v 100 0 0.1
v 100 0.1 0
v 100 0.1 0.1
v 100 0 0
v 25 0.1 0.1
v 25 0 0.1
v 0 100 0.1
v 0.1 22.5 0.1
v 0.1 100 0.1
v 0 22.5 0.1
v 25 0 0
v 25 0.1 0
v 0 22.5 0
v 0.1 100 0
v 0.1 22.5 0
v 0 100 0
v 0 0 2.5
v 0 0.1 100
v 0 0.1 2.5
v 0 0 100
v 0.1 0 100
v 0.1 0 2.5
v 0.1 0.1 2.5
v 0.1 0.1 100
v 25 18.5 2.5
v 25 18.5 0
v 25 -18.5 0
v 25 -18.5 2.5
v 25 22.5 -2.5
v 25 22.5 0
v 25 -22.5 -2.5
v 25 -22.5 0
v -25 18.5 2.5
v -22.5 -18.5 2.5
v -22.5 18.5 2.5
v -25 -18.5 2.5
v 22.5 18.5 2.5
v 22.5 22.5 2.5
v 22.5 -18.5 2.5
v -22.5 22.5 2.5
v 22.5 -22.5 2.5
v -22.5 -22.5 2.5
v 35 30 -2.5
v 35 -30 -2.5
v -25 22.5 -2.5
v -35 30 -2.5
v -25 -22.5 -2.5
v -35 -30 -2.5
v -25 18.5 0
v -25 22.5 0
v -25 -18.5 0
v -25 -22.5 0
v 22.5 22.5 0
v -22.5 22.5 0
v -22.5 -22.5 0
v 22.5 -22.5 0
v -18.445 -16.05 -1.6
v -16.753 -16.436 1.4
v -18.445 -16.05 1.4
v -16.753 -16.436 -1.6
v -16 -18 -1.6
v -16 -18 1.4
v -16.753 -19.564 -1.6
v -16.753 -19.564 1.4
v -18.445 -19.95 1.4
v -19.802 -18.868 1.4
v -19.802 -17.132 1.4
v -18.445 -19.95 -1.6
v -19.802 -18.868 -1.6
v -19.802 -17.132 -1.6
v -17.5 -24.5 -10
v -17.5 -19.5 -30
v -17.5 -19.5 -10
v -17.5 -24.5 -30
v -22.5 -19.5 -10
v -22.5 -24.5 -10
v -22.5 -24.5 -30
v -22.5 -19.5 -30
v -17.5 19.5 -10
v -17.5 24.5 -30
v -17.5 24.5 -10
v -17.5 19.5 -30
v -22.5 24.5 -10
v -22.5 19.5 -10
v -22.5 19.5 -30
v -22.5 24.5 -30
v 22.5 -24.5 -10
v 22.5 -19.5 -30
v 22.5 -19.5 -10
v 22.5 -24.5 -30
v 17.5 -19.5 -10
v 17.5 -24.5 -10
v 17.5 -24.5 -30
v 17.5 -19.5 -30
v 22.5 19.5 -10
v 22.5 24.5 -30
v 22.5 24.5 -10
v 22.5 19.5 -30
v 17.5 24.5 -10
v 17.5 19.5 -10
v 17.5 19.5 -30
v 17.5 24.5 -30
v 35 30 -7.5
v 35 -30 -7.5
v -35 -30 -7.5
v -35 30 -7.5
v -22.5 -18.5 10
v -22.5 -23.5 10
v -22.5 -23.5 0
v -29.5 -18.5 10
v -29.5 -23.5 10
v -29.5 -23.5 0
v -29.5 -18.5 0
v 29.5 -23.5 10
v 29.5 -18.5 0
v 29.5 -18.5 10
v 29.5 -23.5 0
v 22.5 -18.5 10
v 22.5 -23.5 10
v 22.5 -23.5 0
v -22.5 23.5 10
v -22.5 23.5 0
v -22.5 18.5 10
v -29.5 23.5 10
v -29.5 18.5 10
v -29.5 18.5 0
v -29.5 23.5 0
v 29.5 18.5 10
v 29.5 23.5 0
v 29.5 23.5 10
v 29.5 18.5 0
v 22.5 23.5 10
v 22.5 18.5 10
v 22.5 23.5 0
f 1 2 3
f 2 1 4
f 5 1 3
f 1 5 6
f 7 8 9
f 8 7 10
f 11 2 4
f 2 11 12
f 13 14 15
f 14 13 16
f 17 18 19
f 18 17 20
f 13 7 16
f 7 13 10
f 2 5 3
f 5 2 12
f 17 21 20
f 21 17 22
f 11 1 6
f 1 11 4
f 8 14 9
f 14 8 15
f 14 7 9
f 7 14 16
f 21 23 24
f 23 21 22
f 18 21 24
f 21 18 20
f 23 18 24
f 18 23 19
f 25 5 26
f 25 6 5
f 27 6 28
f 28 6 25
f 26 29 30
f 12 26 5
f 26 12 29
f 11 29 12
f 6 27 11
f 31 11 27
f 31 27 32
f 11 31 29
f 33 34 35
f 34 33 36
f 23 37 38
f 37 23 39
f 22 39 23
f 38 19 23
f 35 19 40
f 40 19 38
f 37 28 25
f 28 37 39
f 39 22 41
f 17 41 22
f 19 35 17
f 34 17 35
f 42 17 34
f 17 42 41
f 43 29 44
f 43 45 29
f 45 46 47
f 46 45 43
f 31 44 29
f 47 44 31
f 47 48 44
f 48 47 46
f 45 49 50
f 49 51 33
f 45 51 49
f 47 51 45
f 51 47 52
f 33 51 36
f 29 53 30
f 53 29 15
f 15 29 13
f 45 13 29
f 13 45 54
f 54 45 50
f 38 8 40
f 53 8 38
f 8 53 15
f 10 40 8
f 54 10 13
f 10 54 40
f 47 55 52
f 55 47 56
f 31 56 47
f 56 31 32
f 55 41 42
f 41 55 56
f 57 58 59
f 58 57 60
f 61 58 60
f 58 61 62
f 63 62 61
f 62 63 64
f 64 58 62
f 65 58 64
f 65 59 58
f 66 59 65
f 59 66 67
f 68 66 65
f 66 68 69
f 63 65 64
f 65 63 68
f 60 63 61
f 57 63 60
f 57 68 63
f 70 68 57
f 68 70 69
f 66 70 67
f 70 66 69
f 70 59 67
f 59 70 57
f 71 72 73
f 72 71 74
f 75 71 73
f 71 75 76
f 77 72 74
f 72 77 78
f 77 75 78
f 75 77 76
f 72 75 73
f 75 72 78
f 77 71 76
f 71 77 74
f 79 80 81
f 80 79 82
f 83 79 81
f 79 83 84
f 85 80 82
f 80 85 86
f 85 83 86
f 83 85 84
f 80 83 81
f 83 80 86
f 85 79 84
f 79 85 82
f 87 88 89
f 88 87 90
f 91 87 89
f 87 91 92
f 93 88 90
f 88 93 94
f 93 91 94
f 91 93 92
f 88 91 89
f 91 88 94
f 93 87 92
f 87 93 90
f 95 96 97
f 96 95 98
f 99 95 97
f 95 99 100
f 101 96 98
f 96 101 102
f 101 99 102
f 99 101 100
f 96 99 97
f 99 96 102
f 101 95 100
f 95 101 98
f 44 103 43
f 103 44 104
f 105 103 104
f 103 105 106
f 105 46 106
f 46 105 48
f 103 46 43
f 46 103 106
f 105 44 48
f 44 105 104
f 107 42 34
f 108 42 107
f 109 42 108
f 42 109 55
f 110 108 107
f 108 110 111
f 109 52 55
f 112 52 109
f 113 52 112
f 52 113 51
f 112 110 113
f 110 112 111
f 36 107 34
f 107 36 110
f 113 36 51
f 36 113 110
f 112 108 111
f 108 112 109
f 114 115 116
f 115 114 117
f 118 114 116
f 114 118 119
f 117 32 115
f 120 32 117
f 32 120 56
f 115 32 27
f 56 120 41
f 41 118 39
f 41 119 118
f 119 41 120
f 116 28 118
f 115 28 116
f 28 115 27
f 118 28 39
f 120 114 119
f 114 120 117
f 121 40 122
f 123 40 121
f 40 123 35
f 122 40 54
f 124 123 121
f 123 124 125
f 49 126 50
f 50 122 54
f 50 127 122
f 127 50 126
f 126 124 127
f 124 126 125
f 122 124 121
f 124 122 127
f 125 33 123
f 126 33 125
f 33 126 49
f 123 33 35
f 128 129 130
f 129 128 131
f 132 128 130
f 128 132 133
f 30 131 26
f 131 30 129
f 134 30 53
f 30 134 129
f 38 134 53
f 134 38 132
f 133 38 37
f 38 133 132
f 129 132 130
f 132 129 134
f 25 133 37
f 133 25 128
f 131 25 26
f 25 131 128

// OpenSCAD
    // Combined Scene

    // Permanent Model
    
    // Permanent Model (Black)
    color([0, 0, 0]) {
        // Your permanent model code here
        cube([100,0.1,0.1], center = false);
        cube([0.1,100,0.1], center = false);
        cube([0.1,0.1,100], center = false);
    }
    

    // Dynamic Model
    translate([0, 0, 0]) {
    // Chair seat dimensions
    seat_height = 5; 
    seat_width = 50; 
    seat_depth = 45; 
    difference() {
        cube([seat_width, seat_depth, seat_height], center=true); // Main seat
        translate([-18, -18, -0.1]) 
            cylinder(h=3, r=2, center=true); // Cutout for lighter seat
    }

    // Ergonomic backrest with a smooth curve
    backrest_height = 30; 
    backrest_width = 45; 
    translate([0, -22, seat_height]) {
        rotate_extrude(angle=180) {
            translate([0, 10, 0])
                circle(r=20); // Smooth backrest curve
        }
    }

    // Chair legs with strength and stability
    leg_height = 20; 
    leg_thickness = 5; 
    for (x = [-1, 1]) {
        for (y = [-1, 1]) {
            translate([20 * x, 22 * y, -leg_height]) {
                cube([leg_thickness, leg_thickness, leg_height], center=true); // All four legs
            }
        }
    }

    // Curved armrests for comfort
    armrest_thickness = 10; 
    for (x = [-1, 1]) {
        translate([24 * x, -25, 10]) {
            difference() {
                scale([1, 0.5, 1])
                    rotate_extrude(angle=180)
                        translate([0, 6, 0])
                        circle(r=4); // Armrest contour
                translate([-6, -0.5, 0])
                    cube([12, 1, armrest_thickness], center=true); // Armrest thickness
            }
        }
    }

    // Base for added stability 
    base_height = 5; 
    base_width = 70; 
    base_depth = 60; 
    translate([0, 0, -base_height]) {
        cube([base_width, base_depth, base_height], center=true); // Base platform
    }
    
    // Tolerance adjustments for easier assembly
    translate([-26, -21, seat_height]) {
        cube([7, 5, 10], center=true); // Tolerance cutout for leg attachment
    }
    
    translate([26, -21, seat_height]) {
        cube([7, 5, 10], center=true); // Tolerance cutout for leg attachment
    }

    translate([-26, 21, seat_height]) {
        cube([7, 5, 10], center=true); // Tolerance cutout for leg attachment
    }

    translate([26, 21, seat_height]) {
        cube([7, 5, 10], center=true); // Tolerance cutout for leg attachment
    }
}
    
